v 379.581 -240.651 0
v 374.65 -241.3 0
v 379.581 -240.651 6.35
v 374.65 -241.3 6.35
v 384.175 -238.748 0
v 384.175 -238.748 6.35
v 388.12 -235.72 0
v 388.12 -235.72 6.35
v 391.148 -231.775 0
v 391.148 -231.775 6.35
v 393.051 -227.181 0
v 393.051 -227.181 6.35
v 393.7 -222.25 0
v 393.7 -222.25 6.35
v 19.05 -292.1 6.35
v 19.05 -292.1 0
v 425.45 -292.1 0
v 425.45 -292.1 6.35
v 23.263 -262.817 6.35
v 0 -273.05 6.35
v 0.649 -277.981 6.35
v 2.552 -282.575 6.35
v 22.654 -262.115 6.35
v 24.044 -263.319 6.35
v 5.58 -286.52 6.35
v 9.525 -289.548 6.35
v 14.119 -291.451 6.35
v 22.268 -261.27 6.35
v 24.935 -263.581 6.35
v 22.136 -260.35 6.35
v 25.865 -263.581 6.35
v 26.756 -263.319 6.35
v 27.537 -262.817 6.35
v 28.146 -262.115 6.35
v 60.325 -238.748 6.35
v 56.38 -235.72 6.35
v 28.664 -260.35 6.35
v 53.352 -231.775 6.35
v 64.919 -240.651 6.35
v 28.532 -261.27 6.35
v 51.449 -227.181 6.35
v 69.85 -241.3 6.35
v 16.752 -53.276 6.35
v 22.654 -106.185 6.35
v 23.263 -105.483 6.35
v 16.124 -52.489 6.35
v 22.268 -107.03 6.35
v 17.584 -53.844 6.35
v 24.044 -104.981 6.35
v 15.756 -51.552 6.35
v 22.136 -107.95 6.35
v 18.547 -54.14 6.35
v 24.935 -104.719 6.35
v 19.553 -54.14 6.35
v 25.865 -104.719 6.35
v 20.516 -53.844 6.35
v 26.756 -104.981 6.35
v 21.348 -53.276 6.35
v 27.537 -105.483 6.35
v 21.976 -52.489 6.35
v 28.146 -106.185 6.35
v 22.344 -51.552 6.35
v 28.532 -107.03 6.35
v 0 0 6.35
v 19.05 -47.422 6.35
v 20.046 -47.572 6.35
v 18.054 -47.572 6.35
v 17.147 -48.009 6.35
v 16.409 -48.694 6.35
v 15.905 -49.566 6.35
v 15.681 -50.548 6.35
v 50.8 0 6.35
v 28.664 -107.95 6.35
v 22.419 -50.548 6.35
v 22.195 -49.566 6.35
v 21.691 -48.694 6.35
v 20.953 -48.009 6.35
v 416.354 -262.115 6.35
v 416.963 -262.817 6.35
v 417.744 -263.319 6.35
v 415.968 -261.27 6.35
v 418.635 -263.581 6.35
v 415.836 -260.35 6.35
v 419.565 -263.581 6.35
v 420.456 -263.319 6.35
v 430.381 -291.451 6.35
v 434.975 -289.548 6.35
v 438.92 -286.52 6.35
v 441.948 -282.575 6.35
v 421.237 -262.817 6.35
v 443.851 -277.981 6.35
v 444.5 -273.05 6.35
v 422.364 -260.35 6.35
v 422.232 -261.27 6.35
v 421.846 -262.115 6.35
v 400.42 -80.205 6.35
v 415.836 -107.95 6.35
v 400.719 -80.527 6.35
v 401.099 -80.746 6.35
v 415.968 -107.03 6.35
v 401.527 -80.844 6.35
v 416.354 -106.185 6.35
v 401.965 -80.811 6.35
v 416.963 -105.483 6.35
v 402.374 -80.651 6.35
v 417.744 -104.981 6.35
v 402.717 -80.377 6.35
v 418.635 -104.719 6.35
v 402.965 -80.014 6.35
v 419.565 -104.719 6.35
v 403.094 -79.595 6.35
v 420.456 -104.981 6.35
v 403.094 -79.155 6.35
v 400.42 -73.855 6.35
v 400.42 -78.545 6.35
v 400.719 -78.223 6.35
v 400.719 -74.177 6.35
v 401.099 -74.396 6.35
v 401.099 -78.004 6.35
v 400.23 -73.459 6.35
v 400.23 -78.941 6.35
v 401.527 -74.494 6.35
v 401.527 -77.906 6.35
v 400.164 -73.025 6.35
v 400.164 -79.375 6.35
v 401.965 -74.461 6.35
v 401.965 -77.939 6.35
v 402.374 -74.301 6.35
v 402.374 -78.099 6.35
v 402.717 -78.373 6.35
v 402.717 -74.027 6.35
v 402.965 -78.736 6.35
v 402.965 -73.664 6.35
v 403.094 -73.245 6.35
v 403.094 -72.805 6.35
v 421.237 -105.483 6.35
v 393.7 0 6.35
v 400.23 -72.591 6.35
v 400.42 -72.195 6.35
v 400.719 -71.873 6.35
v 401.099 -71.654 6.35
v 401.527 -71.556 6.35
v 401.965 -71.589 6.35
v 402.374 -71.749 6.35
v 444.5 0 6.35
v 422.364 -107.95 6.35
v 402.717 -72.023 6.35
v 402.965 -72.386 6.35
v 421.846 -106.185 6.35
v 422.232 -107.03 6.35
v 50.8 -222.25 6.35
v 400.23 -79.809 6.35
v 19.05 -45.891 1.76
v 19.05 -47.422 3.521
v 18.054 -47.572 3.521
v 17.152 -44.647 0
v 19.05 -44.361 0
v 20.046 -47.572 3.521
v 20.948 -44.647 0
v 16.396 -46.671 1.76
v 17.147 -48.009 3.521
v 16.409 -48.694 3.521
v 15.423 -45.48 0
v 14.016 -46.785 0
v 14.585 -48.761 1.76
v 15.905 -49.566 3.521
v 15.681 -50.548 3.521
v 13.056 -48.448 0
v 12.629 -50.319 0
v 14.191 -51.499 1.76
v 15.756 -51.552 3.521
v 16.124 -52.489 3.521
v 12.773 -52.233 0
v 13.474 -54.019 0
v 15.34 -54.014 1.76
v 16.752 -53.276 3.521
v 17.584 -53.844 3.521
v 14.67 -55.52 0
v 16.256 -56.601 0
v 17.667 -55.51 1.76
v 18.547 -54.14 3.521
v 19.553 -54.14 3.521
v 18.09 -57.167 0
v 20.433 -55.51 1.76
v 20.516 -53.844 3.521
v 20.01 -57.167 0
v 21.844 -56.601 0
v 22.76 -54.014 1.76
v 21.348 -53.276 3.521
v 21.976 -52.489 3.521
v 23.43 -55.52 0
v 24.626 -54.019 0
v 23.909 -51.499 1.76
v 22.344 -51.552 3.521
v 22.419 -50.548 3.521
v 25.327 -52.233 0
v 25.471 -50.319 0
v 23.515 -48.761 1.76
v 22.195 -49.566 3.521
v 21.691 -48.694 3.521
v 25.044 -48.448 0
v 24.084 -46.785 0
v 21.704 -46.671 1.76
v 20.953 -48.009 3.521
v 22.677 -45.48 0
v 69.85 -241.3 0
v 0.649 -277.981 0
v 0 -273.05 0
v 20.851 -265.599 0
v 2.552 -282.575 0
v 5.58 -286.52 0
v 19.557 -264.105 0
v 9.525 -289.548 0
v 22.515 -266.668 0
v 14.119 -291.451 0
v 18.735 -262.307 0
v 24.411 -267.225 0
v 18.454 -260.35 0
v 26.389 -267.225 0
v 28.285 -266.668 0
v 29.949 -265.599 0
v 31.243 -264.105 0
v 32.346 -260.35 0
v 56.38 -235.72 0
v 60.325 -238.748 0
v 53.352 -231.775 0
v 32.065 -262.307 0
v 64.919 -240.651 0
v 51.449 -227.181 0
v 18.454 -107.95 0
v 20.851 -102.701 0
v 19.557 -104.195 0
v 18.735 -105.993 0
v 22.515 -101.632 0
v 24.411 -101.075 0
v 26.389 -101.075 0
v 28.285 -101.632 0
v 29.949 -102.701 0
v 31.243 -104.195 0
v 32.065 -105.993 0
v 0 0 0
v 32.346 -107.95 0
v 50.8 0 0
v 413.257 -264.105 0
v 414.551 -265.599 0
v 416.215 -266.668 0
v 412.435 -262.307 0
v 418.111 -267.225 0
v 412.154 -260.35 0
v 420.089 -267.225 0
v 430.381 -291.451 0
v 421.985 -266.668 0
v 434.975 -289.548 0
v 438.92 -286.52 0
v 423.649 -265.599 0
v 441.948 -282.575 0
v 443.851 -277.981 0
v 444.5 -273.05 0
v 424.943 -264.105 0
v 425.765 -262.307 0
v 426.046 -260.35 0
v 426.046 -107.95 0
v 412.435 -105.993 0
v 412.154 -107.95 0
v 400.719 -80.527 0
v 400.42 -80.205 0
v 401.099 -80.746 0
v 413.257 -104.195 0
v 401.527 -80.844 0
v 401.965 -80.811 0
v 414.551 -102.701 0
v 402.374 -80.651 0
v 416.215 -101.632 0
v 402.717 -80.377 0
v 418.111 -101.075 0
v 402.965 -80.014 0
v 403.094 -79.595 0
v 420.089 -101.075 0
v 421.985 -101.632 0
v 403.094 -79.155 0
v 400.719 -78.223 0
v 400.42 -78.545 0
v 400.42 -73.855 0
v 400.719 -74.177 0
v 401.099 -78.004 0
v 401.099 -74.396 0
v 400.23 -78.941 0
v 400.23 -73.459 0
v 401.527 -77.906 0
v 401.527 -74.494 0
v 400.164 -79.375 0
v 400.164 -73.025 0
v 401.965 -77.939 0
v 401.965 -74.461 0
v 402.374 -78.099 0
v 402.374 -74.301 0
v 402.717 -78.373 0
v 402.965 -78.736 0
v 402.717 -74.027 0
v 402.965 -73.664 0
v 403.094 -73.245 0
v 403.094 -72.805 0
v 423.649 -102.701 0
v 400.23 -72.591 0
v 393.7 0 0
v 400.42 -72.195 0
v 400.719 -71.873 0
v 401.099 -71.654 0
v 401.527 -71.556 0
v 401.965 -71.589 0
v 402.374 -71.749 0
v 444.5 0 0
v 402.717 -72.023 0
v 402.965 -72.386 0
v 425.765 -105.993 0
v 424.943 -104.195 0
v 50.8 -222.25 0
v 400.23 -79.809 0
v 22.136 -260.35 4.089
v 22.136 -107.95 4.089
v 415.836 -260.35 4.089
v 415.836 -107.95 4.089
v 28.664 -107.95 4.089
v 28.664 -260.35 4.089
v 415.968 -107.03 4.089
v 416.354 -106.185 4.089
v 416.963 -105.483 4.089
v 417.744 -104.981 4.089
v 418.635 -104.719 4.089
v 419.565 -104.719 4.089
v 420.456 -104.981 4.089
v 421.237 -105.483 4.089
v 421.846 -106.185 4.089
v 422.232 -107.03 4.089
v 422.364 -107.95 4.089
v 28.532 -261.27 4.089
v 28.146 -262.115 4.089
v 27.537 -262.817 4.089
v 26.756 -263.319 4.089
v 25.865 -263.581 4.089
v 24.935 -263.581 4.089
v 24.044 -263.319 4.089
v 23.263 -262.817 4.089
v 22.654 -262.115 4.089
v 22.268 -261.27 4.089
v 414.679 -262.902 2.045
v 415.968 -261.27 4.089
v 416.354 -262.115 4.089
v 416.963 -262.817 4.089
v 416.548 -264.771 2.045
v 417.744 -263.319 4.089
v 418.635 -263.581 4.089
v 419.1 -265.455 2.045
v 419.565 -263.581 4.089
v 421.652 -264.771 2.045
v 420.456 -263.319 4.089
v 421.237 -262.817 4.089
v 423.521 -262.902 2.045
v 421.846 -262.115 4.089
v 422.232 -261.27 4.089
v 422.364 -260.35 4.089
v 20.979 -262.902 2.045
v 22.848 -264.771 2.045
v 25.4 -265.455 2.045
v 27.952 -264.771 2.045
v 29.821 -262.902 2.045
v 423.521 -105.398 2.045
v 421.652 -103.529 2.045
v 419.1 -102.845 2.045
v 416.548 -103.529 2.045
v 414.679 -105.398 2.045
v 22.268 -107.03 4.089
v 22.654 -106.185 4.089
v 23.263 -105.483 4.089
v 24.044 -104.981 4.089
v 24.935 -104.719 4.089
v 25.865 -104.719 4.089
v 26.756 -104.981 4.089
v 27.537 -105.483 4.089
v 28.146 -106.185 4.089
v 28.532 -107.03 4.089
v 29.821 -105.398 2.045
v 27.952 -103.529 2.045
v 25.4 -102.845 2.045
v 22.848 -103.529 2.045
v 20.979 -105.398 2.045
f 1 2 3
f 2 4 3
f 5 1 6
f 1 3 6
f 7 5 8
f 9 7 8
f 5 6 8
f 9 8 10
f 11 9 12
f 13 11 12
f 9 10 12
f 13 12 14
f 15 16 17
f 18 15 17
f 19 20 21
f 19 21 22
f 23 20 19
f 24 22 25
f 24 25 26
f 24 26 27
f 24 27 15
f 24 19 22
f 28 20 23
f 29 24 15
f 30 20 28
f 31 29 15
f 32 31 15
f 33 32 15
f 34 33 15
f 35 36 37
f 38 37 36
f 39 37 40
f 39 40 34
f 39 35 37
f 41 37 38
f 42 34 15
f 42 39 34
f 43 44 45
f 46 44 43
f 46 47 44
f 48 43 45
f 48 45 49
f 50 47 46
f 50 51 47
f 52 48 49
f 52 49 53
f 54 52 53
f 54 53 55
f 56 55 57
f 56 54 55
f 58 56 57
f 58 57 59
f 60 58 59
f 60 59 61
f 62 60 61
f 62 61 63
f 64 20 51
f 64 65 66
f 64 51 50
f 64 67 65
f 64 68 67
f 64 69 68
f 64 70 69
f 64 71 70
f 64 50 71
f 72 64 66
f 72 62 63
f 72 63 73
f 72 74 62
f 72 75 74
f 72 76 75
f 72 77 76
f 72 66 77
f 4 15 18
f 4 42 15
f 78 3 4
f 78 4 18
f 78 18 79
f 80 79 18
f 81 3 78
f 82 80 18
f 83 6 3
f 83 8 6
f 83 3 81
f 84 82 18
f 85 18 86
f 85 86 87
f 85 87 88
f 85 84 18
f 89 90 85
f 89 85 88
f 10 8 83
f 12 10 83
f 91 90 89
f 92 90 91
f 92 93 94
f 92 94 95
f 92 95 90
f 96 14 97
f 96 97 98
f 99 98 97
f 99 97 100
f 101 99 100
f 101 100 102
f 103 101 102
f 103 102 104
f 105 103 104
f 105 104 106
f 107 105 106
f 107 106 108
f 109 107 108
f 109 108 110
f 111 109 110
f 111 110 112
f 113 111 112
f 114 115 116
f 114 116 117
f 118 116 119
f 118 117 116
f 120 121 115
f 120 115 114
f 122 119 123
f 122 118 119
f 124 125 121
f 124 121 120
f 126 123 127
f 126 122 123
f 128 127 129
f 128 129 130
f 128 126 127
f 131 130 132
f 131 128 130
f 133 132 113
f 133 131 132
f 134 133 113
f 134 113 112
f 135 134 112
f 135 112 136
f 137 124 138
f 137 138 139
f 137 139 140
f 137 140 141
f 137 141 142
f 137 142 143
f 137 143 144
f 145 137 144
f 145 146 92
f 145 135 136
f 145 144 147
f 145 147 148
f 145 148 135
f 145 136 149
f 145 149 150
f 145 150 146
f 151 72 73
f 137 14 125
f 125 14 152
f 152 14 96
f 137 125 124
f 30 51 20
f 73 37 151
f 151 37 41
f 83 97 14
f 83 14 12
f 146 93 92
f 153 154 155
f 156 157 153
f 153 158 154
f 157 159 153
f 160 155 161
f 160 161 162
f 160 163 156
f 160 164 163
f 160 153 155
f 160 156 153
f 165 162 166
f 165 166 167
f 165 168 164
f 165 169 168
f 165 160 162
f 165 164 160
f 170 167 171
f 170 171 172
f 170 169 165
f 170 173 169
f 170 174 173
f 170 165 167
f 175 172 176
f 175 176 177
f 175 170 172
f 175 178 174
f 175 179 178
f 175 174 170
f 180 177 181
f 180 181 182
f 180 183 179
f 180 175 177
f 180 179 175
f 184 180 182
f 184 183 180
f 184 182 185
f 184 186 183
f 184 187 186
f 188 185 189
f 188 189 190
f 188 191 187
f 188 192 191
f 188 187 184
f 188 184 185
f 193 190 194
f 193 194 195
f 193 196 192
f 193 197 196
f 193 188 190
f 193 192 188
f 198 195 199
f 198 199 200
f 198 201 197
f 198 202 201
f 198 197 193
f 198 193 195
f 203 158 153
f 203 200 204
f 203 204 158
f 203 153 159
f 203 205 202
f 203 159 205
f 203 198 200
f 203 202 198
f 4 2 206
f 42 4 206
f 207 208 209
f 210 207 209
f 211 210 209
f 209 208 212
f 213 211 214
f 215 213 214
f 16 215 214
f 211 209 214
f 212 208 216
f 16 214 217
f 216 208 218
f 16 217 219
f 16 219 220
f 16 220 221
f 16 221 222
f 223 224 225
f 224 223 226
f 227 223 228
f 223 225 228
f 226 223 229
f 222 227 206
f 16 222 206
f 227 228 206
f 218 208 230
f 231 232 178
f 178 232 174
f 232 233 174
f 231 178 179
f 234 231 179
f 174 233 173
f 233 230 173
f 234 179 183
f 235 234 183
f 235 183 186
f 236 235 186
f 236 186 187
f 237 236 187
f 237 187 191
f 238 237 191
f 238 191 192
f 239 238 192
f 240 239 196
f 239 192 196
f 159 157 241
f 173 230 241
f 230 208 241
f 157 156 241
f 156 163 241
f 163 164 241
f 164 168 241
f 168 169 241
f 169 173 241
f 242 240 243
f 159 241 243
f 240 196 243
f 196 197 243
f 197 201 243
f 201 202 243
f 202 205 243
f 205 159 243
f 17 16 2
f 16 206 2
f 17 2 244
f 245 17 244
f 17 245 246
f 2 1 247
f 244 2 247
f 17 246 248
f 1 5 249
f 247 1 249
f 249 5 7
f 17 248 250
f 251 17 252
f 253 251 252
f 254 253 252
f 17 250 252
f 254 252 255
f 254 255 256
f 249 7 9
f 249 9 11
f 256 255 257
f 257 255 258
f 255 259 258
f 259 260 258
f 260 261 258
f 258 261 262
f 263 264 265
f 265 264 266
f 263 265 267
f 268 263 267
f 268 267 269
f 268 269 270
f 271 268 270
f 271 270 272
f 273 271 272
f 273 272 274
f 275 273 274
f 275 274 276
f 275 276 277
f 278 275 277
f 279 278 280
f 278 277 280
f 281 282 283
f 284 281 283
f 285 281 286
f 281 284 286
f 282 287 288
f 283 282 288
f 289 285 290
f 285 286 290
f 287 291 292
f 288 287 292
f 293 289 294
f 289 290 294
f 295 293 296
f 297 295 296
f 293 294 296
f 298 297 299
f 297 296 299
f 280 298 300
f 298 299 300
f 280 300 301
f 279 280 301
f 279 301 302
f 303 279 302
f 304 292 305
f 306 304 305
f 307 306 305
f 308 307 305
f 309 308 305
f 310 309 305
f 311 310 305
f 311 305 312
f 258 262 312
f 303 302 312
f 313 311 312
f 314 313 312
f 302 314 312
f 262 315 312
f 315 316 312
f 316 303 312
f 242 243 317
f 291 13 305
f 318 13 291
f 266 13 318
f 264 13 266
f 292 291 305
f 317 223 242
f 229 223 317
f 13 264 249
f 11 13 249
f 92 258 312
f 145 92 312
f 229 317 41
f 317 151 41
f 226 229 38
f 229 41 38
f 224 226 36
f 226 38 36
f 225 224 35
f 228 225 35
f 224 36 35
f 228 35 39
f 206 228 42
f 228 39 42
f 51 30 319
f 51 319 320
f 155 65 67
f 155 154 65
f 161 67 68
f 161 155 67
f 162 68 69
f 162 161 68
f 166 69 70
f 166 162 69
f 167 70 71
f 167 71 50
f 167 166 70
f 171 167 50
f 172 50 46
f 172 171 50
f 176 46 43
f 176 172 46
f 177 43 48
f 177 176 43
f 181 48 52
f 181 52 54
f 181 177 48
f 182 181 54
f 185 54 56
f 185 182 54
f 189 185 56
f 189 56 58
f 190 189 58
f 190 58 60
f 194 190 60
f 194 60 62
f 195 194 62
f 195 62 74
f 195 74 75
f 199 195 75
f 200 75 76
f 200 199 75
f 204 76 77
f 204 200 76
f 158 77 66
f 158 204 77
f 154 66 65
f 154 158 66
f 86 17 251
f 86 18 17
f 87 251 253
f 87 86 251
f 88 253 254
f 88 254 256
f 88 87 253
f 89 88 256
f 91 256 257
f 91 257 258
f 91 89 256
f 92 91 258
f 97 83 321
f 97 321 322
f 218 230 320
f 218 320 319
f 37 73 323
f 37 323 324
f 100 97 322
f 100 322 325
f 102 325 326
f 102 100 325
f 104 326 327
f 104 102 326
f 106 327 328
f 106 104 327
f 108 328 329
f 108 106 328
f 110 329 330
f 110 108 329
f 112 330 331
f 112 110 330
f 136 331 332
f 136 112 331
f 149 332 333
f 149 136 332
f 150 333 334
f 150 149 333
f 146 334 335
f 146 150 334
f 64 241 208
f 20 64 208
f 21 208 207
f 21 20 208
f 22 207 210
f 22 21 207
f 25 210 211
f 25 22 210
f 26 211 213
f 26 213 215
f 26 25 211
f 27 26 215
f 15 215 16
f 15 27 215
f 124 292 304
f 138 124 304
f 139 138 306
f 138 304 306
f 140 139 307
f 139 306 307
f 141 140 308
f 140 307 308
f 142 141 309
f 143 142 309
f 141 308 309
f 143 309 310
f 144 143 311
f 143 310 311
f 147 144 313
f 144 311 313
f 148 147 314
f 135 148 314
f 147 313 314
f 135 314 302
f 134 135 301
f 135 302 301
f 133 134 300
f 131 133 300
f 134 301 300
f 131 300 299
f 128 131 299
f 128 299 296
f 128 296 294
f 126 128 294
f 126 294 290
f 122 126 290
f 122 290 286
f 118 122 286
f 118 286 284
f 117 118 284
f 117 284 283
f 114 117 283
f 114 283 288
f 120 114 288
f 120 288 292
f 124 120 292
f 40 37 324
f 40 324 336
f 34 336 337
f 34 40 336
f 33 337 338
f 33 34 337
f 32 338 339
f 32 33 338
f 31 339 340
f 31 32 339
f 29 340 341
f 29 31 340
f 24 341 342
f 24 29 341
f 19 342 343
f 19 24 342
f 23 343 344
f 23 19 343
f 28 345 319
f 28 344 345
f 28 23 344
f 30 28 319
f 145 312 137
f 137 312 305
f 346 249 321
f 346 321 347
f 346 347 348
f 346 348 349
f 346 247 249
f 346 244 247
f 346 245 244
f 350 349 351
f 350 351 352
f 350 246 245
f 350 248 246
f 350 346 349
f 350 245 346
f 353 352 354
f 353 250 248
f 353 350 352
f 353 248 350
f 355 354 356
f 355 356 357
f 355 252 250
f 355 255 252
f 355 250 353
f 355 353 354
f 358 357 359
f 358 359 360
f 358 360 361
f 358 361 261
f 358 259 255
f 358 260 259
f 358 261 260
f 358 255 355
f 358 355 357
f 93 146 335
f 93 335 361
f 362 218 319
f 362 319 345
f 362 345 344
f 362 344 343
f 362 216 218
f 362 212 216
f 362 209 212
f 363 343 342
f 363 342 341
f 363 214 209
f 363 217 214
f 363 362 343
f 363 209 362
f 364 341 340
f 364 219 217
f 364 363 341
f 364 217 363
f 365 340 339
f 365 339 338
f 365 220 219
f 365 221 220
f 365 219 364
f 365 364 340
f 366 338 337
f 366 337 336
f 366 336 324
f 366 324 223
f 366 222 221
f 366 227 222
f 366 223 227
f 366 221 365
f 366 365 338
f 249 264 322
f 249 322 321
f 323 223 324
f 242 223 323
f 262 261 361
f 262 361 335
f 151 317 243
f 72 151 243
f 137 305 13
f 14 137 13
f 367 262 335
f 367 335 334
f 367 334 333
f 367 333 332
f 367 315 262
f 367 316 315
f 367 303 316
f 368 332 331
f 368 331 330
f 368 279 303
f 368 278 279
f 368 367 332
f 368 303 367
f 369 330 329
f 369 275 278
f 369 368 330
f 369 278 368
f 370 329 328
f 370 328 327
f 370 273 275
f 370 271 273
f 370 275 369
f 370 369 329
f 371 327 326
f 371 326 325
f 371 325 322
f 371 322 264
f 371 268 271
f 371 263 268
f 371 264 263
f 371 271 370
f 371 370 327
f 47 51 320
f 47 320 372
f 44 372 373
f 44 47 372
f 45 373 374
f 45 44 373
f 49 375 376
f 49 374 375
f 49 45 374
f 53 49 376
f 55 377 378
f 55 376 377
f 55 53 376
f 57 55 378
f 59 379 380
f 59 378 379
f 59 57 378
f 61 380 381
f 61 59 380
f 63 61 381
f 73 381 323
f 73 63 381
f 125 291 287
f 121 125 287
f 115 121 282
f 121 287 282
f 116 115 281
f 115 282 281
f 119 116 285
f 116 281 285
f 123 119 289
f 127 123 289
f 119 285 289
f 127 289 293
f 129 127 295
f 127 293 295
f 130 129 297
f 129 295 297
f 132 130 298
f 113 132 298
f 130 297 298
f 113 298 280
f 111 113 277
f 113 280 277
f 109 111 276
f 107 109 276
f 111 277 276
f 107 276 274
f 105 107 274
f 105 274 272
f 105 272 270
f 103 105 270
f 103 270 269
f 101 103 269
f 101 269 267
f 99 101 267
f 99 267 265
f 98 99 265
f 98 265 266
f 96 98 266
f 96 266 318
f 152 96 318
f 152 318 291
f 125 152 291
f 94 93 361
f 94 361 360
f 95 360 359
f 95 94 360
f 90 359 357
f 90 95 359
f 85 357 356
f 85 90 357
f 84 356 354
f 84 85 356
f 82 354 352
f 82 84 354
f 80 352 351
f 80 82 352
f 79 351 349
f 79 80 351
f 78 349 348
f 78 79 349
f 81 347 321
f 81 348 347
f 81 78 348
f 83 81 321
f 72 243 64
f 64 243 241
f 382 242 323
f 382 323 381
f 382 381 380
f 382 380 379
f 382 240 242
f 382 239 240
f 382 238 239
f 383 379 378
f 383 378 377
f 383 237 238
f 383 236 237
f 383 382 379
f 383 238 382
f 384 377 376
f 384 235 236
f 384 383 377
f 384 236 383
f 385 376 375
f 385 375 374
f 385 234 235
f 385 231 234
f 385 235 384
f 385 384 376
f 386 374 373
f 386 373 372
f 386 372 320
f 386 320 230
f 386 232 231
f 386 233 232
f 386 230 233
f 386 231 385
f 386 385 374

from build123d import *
from OCP.BRepFilletAPI import BRepFilletAPI_MakeChamfer

# Parameters (mm, degrees)
BOSS_EXTRUDE1_DEPTH             = 6.35
FILLET5_R                       = 19.05
FILLET6_R                       = 19.05
FILLET7_R                       = 19.05
FILLET8_R                       = 19.05
CUT_EXTRUDE1_DEPTH              = 532.923850283
CUT_EXTRUDE2_DEPTH              = 532.923850283
CHAMFER1_SIZE                   = 4.0894
CHAMFER1_SIZE2                  = 3.682112299
CHAMFER2_SIZE                   = 4.0894
CHAMFER2_SIZE2                  = 3.682112299
F_32_0_116_DIAMETER_HOLE1_D     = 2.9464
F_32_0_116_DIAMETER_HOLE1_DEPTH = 25.4
F_32_0_116_DIAMETER_HOLE1_TIP   = 0.885187864


with BuildPart() as part:
    # Sketch1 → Boss-Extrude1 (new body)
    with BuildSketch(Plane.XY):
        Polygon((0, 0), (0, -292.1), (444.5, -292.1), (444.5, 0), (393.7, 0), (393.7, -241.3), (50.8, -241.3), (50.8, 0), align=None)
    extrude(amount=BOSS_EXTRUDE1_DEPTH)

    # Fillet5
    fillet5_edges = [part.edges().sort_by_distance(p)[0] for p in [
        (0, -292.1, 3.175),
    ]]
    fillet(fillet5_edges, radius=FILLET5_R)

    # Fillet6
    fillet6_edges = [part.edges().sort_by_distance(p)[0] for p in [
        (444.5, -292.1, 3.175),
    ]]
    fillet(fillet6_edges, radius=FILLET6_R)

    # Fillet7
    fillet7_edges = [part.edges().sort_by_distance(p)[0] for p in [
        (50.8, -241.3, 3.175),
    ]]
    fillet(fillet7_edges, radius=FILLET7_R)

    # Fillet8
    fillet8_edges = [part.edges().sort_by_distance(p)[0] for p in [
        (393.7, -241.3, 3.175),
    ]]
    fillet(fillet8_edges, radius=FILLET8_R)

    # Sketch2 → Cut-Extrude1 (cut, through all)
    with BuildSketch(Plane.XY.offset(6.35)):
        with BuildLine():
            Line((22.1361, -260.35), (22.1361, -107.95))
            ThreePointArc((22.1361, -107.95), (25.4, -104.6861), (28.6639, -107.95))
            Line((28.6639, -107.95), (28.6639, -260.35))
            ThreePointArc((28.6639, -260.35), (25.4, -263.6139), (22.1361, -260.35))
        make_face()
    extrude(amount=-CUT_EXTRUDE1_DEPTH, mode=Mode.SUBTRACT)

    # Sketch4 → Cut-Extrude2 (cut, through all)
    with BuildSketch(Plane.XY.offset(6.35)):
        with BuildLine():
            Line((415.8361, -260.35), (415.8361, -107.95))
            ThreePointArc((415.8361, -107.95), (419.1, -104.6861), (422.3639, -107.95))
            Line((422.3639, -107.95), (422.3639, -260.35))
            ThreePointArc((422.3639, -260.35), (419.1, -263.6139), (415.8361, -260.35))
        make_face()
    extrude(amount=-CUT_EXTRUDE2_DEPTH, mode=Mode.SUBTRACT)

    # Sketch10 → CSK for 1/4 Flat Head Machine Screw2 (revolve, cut)
    with BuildSketch(Plane(origin=(19.05, -50.8, 0), x_dir=(0, 1, 0), z_dir=(1, 0, 0))):
        Polygon((0, 0), (0, 6.35), (3.3782, 6.35), (3.3782, 3.520932584), (6.4389, 0), align=None)
    revolve(axis=Axis((19.05, -50.8, -6.35), (0, 0, 1)), mode=Mode.SUBTRACT)

    # Chamfer1: one chamfer whose edges measure the first distance from different faces: ONE call of the kernel's chamfer builder (chamfer() names one face for all edges)
    chamfer1_edges_1 = [part.edges().sort_by_distance(p)[0] for p in [
        (419.1, -263.6139, 0),
    ]]
    chamfer1_side_1 = [part.faces().sort_by_distance(p)[0] for p in [
        (419.1, -263.6139, 3.175),
    ]]
    chamfer1_edges_2 = [part.edges().sort_by_distance(p)[0] for p in [
        (415.8361, -184.15, 0),
    ]]
    chamfer1_side_2 = [part.faces().sort_by_distance(p)[0] for p in [
        (415.8361, -184.15, 3.175),
    ]]
    chamfer1_edges_3 = [part.edges().sort_by_distance(p)[0] for p in [
        (419.1, -104.6861, 0),
    ]]
    chamfer1_side_3 = [part.faces().sort_by_distance(p)[0] for p in [
        (419.1, -104.6861, 3.175),
    ]]
    chamfer1_edges_4 = [part.edges().sort_by_distance(p)[0] for p in [
        (422.3639, -184.15, 0),
    ]]
    chamfer1_side_4 = [part.faces().sort_by_distance(p)[0] for p in [
        (422.3639, -184.15, 3.175),
    ]]
    chamfer1 = BRepFilletAPI_MakeChamfer(part.part.solid().wrapped)
    for e in chamfer1_edges_1:
        chamfer1.Add(CHAMFER1_SIZE, CHAMFER1_SIZE2, e.wrapped, chamfer1_side_1[0].wrapped)  # the first distance lies on this face
    for e in chamfer1_edges_2:
        chamfer1.Add(CHAMFER1_SIZE, CHAMFER1_SIZE2, e.wrapped, chamfer1_side_2[0].wrapped)  # the first distance lies on this face
    for e in chamfer1_edges_3:
        chamfer1.Add(CHAMFER1_SIZE, CHAMFER1_SIZE2, e.wrapped, chamfer1_side_3[0].wrapped)  # the first distance lies on this face
    for e in chamfer1_edges_4:
        chamfer1.Add(CHAMFER1_SIZE, CHAMFER1_SIZE2, e.wrapped, chamfer1_side_4[0].wrapped)  # the first distance lies on this face
    add(Compound.cast(chamfer1.Shape()), mode=Mode.REPLACE)

    # Chamfer2: one chamfer whose edges measure the first distance from different faces: ONE call of the kernel's chamfer builder (chamfer() names one face for all edges)
    chamfer2_edges_1 = [part.edges().sort_by_distance(p)[0] for p in [
        (25.4, -263.6139, 0),
    ]]
    chamfer2_side_1 = [part.faces().sort_by_distance(p)[0] for p in [
        (25.4, -263.6139, 3.175),
    ]]
    chamfer2_edges_2 = [part.edges().sort_by_distance(p)[0] for p in [
        (25.4, -104.6861, 0),
    ]]
    chamfer2_side_2 = [part.faces().sort_by_distance(p)[0] for p in [
        (25.4, -104.6861, 3.175),
    ]]
    chamfer2_edges_3 = [part.edges().sort_by_distance(p)[0] for p in [
        (28.6639, -184.15, 0),
    ]]
    chamfer2_side_3 = [part.faces().sort_by_distance(p)[0] for p in [
        (28.6639, -184.15, 3.175),
    ]]
    chamfer2_edges_4 = [part.edges().sort_by_distance(p)[0] for p in [
        (22.1361, -184.15, 0),
    ]]
    chamfer2_side_4 = [part.faces().sort_by_distance(p)[0] for p in [
        (22.1361, -184.15, 3.175),
    ]]
    chamfer2 = BRepFilletAPI_MakeChamfer(part.part.solid().wrapped)
    for e in chamfer2_edges_1:
        chamfer2.Add(CHAMFER2_SIZE, CHAMFER2_SIZE2, e.wrapped, chamfer2_side_1[0].wrapped)  # the first distance lies on this face
    for e in chamfer2_edges_2:
        chamfer2.Add(CHAMFER2_SIZE, CHAMFER2_SIZE2, e.wrapped, chamfer2_side_2[0].wrapped)  # the first distance lies on this face
    for e in chamfer2_edges_3:
        chamfer2.Add(CHAMFER2_SIZE, CHAMFER2_SIZE2, e.wrapped, chamfer2_side_3[0].wrapped)  # the first distance lies on this face
    for e in chamfer2_edges_4:
        chamfer2.Add(CHAMFER2_SIZE, CHAMFER2_SIZE2, e.wrapped, chamfer2_side_4[0].wrapped)  # the first distance lies on this face
    add(Compound.cast(chamfer2.Shape()), mode=Mode.REPLACE)

    # #32 (0.116) Diameter Hole1
    with Locations(Plane.XY.offset(6.35)):
        with Locations((401.6375, -73.025), (401.6375, -79.375)):
            Hole(F_32_0_116_DIAMETER_HOLE1_D / 2, depth=F_32_0_116_DIAMETER_HOLE1_DEPTH)
            with Locations((0, 0, -(F_32_0_116_DIAMETER_HOLE1_DEPTH + F_32_0_116_DIAMETER_HOLE1_TIP / 2))):  # 118° drill point
                Cone(0, F_32_0_116_DIAMETER_HOLE1_D / 2, F_32_0_116_DIAMETER_HOLE1_TIP, mode=Mode.SUBTRACT)


solid = part.part
